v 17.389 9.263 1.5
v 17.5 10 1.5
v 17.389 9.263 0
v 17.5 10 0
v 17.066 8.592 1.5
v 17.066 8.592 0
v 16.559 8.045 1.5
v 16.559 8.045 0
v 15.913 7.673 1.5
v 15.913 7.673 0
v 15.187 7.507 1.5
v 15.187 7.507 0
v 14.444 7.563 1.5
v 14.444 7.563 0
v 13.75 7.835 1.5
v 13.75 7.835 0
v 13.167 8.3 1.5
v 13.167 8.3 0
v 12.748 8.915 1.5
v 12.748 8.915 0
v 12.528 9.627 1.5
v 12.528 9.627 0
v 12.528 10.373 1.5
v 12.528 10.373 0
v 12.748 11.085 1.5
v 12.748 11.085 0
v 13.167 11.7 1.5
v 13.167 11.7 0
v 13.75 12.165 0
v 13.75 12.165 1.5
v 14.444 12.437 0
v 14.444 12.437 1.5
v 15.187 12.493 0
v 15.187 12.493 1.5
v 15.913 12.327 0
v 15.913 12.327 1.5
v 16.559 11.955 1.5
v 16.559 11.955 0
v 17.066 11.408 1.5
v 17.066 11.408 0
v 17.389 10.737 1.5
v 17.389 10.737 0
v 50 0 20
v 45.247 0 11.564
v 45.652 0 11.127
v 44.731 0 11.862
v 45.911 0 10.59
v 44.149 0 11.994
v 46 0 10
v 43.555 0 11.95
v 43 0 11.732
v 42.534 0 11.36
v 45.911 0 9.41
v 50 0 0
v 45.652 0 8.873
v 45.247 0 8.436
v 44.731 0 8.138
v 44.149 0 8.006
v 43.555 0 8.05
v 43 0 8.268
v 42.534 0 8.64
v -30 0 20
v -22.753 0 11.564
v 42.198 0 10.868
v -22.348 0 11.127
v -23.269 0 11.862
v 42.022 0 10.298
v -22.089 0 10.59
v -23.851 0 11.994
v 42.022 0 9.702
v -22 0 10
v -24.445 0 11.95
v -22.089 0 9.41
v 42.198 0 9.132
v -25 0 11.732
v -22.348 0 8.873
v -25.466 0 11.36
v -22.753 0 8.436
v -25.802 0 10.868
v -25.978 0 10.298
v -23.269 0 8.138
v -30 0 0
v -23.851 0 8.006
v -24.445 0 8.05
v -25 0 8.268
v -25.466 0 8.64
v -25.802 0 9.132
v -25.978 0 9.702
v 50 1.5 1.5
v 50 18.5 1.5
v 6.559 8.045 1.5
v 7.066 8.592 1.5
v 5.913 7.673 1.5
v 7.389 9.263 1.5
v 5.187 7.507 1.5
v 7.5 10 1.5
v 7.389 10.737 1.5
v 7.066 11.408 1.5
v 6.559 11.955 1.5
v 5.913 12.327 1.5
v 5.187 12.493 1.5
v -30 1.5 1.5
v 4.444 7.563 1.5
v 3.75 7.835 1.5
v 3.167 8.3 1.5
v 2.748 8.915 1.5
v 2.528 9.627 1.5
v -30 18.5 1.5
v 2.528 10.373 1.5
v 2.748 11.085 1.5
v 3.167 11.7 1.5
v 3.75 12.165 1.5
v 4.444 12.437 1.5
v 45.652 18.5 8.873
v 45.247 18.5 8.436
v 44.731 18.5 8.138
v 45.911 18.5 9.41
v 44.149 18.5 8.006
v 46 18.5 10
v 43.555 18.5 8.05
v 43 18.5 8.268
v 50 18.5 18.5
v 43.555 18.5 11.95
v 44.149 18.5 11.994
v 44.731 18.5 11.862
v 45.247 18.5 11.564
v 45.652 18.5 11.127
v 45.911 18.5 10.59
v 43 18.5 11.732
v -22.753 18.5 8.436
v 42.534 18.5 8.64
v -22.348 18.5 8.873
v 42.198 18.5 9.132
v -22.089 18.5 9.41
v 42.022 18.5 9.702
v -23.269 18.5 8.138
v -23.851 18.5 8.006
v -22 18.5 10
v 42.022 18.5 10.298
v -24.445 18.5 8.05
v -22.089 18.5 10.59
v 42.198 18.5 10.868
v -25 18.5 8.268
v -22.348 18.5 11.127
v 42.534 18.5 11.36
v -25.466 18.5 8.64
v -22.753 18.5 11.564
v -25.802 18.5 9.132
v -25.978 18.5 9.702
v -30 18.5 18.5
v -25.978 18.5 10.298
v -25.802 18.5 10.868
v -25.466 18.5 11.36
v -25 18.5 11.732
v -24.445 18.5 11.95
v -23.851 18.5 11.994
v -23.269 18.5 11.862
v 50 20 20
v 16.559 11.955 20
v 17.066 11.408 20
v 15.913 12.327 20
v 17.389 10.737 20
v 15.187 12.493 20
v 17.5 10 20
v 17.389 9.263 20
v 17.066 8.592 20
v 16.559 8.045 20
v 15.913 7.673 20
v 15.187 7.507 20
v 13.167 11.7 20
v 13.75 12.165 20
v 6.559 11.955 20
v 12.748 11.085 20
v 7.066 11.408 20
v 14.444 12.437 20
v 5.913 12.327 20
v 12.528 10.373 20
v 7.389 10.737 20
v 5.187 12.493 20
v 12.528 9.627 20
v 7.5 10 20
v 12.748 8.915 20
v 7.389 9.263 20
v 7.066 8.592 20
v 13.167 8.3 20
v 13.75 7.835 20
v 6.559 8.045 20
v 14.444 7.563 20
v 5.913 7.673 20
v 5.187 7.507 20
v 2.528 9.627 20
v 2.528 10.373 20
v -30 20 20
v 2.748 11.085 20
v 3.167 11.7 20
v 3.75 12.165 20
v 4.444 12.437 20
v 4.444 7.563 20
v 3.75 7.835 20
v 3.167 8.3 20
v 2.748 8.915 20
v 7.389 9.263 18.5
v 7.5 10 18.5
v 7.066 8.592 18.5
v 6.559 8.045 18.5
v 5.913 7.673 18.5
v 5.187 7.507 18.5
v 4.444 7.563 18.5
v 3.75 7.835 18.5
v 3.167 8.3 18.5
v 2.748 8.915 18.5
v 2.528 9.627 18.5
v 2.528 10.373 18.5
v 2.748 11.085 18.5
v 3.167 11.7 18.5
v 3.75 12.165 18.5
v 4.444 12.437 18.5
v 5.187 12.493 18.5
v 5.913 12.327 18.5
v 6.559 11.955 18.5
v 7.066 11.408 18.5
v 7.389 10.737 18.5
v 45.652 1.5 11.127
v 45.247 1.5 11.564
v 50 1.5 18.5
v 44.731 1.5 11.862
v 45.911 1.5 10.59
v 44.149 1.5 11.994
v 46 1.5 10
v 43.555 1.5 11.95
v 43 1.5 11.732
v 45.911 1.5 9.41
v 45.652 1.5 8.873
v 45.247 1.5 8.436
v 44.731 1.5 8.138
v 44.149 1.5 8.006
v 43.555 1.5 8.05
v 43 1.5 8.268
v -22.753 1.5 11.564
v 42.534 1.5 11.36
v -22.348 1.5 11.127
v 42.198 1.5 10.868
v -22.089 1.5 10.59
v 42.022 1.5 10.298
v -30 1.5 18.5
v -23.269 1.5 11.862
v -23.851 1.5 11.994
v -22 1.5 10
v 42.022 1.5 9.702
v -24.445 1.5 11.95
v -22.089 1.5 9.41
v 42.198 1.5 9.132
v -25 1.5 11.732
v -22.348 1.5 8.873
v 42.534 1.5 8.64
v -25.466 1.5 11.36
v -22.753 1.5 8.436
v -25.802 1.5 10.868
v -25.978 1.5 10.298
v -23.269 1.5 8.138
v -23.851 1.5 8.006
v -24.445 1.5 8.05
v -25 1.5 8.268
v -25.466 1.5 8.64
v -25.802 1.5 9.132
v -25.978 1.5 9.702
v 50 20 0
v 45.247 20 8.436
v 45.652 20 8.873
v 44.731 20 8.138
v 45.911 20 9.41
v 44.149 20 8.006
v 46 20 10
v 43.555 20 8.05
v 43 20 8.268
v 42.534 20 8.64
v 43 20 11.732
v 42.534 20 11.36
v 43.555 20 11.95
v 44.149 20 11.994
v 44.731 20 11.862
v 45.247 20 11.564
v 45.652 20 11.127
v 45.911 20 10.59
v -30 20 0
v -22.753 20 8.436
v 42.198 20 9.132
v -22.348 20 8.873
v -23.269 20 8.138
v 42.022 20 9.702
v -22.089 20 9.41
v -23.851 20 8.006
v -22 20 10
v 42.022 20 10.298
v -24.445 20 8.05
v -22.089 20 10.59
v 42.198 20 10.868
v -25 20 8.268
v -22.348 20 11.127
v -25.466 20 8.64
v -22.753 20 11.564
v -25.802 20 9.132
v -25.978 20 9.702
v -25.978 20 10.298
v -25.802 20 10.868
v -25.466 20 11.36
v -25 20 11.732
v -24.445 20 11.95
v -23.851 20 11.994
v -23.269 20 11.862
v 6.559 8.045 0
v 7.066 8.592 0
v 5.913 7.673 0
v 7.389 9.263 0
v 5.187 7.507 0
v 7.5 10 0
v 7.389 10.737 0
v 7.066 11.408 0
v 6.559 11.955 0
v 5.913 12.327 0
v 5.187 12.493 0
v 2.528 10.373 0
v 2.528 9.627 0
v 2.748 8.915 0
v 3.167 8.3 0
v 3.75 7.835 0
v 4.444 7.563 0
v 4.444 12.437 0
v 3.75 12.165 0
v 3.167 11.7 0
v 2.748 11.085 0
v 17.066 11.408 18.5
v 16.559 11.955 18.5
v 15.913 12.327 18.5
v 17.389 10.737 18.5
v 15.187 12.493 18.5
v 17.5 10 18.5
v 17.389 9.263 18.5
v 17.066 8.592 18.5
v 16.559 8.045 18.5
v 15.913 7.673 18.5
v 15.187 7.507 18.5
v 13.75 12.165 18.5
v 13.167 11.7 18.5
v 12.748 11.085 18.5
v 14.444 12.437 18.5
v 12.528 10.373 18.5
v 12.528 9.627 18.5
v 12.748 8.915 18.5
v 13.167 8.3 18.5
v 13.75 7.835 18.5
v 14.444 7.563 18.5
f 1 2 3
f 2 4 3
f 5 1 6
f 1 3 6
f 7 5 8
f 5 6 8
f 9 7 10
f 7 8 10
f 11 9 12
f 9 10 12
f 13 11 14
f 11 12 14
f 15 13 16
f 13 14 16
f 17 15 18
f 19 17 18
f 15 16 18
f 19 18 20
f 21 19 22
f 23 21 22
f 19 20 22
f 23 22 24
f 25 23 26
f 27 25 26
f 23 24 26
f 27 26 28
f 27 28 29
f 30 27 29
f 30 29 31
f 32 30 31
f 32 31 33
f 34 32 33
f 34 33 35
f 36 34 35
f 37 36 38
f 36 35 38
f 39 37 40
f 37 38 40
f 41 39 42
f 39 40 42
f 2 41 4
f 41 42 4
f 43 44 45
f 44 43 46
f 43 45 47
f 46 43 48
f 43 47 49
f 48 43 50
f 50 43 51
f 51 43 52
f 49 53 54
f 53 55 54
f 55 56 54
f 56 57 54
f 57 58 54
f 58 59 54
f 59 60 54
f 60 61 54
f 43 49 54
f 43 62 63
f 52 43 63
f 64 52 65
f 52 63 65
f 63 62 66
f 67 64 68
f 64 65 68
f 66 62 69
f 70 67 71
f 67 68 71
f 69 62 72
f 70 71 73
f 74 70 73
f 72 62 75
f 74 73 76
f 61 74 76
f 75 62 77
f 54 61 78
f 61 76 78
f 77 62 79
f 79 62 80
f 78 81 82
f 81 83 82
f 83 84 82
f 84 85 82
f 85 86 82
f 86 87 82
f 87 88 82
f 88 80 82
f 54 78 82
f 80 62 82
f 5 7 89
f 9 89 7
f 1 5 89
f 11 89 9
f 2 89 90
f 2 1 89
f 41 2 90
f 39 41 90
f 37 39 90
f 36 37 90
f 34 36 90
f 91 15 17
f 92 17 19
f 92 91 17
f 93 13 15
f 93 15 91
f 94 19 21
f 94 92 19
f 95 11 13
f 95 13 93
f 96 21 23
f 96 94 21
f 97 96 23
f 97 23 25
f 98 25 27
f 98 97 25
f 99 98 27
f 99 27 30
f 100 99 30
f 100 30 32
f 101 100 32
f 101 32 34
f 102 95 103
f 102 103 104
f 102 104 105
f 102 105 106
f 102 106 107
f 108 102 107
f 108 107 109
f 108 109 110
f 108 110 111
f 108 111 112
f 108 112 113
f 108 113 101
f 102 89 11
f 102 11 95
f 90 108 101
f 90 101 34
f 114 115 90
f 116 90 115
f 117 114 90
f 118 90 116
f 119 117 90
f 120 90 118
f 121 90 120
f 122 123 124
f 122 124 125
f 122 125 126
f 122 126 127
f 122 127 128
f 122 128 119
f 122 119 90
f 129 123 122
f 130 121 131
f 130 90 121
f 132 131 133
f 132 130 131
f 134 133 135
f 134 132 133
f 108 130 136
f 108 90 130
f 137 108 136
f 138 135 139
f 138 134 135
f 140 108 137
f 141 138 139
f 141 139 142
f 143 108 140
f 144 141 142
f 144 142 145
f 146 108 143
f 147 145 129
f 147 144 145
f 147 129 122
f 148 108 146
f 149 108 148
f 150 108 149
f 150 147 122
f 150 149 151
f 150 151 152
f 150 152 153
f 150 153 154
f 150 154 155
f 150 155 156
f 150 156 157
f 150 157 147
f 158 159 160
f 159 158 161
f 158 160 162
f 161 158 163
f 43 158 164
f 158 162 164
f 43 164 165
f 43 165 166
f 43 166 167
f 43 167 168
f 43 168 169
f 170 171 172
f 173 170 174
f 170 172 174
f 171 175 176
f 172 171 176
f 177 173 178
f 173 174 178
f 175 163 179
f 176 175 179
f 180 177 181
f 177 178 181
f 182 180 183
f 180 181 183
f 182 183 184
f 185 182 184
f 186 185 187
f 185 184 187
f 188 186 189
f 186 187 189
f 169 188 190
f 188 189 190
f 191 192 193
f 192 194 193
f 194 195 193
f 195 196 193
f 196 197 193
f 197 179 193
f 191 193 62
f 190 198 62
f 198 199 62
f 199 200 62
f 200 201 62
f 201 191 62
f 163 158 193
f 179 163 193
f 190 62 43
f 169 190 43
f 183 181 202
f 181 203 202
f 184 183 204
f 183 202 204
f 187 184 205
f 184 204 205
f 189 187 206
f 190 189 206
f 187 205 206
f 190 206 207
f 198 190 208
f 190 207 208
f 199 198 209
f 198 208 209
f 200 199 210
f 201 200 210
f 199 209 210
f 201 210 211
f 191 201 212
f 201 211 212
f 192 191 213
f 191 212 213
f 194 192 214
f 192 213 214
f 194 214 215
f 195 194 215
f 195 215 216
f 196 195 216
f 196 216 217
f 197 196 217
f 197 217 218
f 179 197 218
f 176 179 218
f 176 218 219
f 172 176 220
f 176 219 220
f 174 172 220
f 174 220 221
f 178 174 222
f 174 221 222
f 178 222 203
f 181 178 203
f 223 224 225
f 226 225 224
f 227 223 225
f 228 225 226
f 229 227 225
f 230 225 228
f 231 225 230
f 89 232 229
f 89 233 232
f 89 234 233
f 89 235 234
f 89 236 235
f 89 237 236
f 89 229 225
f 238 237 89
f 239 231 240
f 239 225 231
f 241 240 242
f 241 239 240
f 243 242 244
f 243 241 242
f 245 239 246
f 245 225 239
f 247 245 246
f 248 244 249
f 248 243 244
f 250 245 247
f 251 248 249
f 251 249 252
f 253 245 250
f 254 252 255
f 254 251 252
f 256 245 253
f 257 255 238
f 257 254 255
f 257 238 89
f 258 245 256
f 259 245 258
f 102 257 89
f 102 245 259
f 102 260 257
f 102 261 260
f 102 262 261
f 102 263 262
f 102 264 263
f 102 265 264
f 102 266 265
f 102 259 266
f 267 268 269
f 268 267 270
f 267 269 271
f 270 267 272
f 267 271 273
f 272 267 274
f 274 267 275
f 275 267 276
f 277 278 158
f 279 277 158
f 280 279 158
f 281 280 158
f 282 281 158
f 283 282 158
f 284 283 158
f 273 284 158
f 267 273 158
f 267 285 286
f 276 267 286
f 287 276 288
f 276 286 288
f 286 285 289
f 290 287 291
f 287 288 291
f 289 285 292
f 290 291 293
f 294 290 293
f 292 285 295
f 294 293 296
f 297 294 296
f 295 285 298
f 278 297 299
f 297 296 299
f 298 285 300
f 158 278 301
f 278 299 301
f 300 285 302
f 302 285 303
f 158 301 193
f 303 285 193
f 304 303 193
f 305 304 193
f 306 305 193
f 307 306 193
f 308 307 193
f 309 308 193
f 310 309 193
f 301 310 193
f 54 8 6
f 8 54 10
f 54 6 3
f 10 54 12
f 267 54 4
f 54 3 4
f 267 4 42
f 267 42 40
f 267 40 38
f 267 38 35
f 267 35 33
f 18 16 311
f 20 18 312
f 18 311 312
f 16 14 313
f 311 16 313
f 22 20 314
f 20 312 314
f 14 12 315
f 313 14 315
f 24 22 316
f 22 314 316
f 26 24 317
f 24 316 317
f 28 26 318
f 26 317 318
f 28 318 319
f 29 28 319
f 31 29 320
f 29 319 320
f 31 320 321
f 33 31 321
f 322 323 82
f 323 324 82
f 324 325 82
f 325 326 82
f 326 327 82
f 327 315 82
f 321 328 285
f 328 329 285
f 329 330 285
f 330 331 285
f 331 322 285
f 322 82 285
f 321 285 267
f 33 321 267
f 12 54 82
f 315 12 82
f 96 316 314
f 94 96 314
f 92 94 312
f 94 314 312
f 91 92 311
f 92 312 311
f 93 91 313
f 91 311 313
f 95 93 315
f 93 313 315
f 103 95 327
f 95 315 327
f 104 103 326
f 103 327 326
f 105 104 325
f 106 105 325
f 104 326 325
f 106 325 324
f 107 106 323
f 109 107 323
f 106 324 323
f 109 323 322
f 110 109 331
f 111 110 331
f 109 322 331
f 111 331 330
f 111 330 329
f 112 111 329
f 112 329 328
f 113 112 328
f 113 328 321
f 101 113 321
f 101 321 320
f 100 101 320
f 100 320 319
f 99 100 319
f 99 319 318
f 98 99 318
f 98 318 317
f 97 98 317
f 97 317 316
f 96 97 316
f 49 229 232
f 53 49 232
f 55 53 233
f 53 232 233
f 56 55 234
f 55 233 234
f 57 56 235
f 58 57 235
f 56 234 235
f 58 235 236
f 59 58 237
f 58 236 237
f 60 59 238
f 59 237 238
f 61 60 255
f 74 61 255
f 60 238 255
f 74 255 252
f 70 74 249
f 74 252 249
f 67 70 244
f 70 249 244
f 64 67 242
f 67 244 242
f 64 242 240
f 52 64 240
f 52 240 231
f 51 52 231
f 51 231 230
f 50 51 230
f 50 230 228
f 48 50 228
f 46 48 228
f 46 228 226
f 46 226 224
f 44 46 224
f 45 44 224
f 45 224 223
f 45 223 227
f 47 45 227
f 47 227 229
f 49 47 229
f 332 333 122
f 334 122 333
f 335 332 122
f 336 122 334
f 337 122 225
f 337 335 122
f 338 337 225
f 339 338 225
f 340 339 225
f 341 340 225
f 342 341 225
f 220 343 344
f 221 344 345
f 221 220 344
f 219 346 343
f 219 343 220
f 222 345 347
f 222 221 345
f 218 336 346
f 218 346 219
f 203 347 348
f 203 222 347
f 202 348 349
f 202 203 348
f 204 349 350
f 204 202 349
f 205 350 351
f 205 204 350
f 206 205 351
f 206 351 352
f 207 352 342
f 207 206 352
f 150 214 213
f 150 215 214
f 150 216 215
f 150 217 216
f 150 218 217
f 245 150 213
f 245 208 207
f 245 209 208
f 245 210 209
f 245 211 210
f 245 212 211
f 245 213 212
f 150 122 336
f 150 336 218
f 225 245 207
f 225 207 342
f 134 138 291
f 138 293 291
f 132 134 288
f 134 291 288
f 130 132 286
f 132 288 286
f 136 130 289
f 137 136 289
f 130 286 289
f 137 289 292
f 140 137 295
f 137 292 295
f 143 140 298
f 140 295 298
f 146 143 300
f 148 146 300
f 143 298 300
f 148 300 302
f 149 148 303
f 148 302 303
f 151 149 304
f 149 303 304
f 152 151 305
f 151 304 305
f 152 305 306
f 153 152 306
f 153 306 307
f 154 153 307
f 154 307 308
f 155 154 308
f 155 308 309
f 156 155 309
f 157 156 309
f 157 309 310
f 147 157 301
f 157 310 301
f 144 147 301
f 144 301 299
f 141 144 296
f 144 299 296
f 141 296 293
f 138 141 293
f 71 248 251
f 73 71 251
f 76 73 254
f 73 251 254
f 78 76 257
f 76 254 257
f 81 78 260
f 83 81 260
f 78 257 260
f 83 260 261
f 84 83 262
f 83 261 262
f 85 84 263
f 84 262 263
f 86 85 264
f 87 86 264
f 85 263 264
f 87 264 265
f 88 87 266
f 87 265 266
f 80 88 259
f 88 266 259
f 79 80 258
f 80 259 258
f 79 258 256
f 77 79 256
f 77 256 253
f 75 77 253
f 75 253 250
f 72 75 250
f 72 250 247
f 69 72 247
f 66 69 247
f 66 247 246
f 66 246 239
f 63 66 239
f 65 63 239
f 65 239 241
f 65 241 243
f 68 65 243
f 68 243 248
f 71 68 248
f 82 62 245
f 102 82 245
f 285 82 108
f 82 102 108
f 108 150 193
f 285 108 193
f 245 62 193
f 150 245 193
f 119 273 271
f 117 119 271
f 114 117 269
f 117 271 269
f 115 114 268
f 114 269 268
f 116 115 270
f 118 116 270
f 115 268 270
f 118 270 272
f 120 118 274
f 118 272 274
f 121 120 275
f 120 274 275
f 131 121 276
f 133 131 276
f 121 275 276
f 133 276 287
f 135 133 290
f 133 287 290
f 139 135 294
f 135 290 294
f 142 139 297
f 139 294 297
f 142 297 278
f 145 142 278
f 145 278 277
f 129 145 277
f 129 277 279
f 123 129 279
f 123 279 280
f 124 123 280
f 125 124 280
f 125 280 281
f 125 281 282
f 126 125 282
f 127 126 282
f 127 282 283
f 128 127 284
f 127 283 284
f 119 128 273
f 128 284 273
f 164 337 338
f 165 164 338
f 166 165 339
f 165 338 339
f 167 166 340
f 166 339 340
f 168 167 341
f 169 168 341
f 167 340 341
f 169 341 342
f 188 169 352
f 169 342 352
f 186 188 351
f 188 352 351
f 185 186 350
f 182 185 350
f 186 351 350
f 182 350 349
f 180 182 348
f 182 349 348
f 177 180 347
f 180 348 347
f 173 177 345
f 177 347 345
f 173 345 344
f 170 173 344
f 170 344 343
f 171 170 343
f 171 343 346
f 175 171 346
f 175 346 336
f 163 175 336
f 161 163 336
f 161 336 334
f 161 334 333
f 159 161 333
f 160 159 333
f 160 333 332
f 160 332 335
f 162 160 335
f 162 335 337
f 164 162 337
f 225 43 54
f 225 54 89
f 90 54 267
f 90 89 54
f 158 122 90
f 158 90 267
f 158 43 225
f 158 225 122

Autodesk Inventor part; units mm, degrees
ref_plane "YZ Plane" through (0, 0, 0) normal (1, 0, 0) x (0, 1, 0)
ref_plane "XZ Plane" through (0, 0, 0) normal (0, 1, 0) x (-1, 0, 0)
ref_plane "XY Plane" through (0, 0, 0) normal (0, 0, 1) x (1, 0, 0)
sketch "Эскиз3" plane through (0, 0, 0) normal (1, 0, 0) x (0, 1, 0)
  line L0 (0, 0) -> (20, 0)
  line L1 (20, 0) -> (20, 20)
  line L2 (20, 20) -> (0, 20)
  line L3 (0, 20) -> (0, 0)
  line L4 (18.5, 18.5) -> (1.5, 18.5)
  line L5 (1.5, 18.5) -> (1.5, 1.5)
  line L6 (1.5, 1.5) -> (18.5, 1.5)
  line L7 (18.5, 1.5) -> (18.5, 18.5)
  point P0 (10, 18.5)
  point P1 (10, 20)
  point P2 (1.5, 10)
  point P3 (0, 10)
  dimension "d2" = 20
  dimension "d3" = 1.5
extrude "Выдавливание1" add sketch "Эскиз3" along normal blind 50 and the other way blind 30
sketch "Эскиз1" plane through (0, 0, 0) normal (0, 0, 1) x (1, 0, 0)
  circle A0 centre (15, 10) radius 2.5 projected
  circle A1 centre (5, 10) radius 2.5 projected
  point P0 (0, 0)
extrude "Выдавливание2" cut sketch "Эскиз1" along normal through all
sketch "Эскиз4" plane through (-30, 20, 20) normal (0, 1, 0) x (1, 0, 0)
  circle A0 centre (6, 10) radius 2
  circle A1 centre (74, 10) radius 2
  line L0 (80, 20) -> (80, 0) construction
  line L1 (80, 20) -> (0, 20) construction
  line L2 (0, 0) -> (0, 20) construction
  point P0 (30, 20)
  point P1 (80, 10)
  dimension "d10" = 4
  dimension "d11" = 6
  dimension "d12" = 6
extrude "Выдавливание3" cut sketch "Эскиз4" against normal through all
properties part number "2" material "Алюминий 6061"
